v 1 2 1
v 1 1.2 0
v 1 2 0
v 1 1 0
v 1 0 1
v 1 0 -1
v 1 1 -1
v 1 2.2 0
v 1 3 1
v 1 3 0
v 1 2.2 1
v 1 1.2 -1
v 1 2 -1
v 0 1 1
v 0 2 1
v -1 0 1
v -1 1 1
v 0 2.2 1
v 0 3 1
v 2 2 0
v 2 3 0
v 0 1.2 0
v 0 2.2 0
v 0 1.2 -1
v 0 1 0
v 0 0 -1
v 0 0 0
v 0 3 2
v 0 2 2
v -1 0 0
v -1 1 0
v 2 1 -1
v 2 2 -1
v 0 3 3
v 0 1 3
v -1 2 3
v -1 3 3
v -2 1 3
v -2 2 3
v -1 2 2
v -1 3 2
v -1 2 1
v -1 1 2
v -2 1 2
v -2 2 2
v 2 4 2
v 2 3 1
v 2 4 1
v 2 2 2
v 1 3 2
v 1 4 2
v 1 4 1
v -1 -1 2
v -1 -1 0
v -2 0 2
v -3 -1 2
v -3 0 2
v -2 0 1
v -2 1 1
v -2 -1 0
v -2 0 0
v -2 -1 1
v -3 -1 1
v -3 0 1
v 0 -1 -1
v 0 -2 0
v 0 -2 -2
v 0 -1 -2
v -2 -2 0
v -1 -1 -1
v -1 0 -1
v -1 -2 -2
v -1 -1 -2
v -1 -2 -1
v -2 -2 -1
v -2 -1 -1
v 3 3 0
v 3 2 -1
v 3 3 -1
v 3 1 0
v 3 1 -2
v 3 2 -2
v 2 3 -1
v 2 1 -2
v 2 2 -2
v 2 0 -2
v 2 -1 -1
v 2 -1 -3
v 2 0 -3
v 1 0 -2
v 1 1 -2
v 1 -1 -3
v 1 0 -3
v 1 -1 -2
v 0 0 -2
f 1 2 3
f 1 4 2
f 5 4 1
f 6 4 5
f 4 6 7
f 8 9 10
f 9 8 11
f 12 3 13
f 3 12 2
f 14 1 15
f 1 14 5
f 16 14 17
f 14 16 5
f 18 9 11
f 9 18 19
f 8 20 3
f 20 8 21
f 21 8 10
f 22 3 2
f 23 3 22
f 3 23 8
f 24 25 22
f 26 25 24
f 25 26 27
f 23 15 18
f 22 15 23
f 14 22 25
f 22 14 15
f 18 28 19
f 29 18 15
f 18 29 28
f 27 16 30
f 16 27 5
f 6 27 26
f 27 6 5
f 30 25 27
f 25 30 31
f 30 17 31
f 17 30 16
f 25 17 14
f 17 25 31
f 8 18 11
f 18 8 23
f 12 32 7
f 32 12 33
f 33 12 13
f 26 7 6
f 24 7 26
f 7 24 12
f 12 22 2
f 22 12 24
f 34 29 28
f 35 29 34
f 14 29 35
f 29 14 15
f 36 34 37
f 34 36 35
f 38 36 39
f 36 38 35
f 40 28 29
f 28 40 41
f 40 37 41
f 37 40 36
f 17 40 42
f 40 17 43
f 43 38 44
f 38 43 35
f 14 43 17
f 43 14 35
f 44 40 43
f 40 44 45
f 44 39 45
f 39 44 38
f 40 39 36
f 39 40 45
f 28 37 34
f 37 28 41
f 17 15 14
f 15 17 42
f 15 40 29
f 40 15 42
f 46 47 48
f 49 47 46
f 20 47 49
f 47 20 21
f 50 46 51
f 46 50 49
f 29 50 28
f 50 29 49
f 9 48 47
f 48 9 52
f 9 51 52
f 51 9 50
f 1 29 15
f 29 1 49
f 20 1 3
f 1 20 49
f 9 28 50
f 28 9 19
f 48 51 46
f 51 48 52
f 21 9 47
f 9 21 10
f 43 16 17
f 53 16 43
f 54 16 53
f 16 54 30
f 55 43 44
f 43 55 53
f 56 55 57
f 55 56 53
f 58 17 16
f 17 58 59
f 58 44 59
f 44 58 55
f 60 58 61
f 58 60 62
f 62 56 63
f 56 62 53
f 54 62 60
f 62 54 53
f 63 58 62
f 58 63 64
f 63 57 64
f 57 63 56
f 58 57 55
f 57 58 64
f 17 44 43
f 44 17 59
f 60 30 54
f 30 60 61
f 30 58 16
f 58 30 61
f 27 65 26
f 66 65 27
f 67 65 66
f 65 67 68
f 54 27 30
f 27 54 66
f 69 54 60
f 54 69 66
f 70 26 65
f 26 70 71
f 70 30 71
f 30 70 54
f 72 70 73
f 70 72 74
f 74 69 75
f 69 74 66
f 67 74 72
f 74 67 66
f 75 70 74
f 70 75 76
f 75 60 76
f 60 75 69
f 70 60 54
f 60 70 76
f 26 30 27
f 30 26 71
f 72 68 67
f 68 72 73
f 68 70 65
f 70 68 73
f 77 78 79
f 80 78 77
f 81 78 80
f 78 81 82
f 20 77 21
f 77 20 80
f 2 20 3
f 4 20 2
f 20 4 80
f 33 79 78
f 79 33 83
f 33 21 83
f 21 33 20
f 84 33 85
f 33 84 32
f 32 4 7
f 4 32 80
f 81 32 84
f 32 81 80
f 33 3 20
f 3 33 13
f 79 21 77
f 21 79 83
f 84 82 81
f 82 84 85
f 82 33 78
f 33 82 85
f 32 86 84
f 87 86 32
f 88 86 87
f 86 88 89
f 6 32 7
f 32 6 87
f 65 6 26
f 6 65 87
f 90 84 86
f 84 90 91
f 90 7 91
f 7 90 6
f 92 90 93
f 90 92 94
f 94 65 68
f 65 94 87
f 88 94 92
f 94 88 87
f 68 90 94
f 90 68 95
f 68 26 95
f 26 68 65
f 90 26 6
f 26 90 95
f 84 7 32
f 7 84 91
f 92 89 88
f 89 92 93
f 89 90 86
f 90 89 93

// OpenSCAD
/**
Model coded by @ken4rab
With licence cc-by-sa 4.0

https://creativecommons.org/licenses/by-sa/4.0/
*/
module module_cube_4(translation= [0,0,0]){
    translate(translation)union() {
cube(1,1,1);    
translate([-1,0,0])cube(size = [1,1,1]);
translate([0,1,0])cube(size = [1,1,1]);
translate([0,0,-1])cube(size = [1,1,1]);
    }
};
module module_cube_4_support(translation= [0,0,0]){
    translate(translation)union() {
cube(1,1,1);    
translate([-1,0,0])cube(size = [1.2,1,1]);
translate([0,1,0])cube(size = [1,1.2,1]);
translate([0,0,-1])cube(size = [1,1.2,1]);
    }
};

module module_cube_7(translation= [0,0,0]){
    translate(translation)union() {
cube(1,1,1);    
translate([-2,0,0])cube(size = [2,1,1]);
translate([0,1,0])cube(size = [1,2,1]);
translate([0,0,-2])cube(size = [1,1,2]);
    }
};

color("blue")module_cube_4_support([0,0,0]);
module_cube_4([-1,1,2]);
module_cube_4([1,2,1]);
module_cube_4([-2,-1,1]);
module_cube_4([-1,-2,-1]);
module_cube_4([2,1,-1]);
module_cube_4([1,-1,-2]);
